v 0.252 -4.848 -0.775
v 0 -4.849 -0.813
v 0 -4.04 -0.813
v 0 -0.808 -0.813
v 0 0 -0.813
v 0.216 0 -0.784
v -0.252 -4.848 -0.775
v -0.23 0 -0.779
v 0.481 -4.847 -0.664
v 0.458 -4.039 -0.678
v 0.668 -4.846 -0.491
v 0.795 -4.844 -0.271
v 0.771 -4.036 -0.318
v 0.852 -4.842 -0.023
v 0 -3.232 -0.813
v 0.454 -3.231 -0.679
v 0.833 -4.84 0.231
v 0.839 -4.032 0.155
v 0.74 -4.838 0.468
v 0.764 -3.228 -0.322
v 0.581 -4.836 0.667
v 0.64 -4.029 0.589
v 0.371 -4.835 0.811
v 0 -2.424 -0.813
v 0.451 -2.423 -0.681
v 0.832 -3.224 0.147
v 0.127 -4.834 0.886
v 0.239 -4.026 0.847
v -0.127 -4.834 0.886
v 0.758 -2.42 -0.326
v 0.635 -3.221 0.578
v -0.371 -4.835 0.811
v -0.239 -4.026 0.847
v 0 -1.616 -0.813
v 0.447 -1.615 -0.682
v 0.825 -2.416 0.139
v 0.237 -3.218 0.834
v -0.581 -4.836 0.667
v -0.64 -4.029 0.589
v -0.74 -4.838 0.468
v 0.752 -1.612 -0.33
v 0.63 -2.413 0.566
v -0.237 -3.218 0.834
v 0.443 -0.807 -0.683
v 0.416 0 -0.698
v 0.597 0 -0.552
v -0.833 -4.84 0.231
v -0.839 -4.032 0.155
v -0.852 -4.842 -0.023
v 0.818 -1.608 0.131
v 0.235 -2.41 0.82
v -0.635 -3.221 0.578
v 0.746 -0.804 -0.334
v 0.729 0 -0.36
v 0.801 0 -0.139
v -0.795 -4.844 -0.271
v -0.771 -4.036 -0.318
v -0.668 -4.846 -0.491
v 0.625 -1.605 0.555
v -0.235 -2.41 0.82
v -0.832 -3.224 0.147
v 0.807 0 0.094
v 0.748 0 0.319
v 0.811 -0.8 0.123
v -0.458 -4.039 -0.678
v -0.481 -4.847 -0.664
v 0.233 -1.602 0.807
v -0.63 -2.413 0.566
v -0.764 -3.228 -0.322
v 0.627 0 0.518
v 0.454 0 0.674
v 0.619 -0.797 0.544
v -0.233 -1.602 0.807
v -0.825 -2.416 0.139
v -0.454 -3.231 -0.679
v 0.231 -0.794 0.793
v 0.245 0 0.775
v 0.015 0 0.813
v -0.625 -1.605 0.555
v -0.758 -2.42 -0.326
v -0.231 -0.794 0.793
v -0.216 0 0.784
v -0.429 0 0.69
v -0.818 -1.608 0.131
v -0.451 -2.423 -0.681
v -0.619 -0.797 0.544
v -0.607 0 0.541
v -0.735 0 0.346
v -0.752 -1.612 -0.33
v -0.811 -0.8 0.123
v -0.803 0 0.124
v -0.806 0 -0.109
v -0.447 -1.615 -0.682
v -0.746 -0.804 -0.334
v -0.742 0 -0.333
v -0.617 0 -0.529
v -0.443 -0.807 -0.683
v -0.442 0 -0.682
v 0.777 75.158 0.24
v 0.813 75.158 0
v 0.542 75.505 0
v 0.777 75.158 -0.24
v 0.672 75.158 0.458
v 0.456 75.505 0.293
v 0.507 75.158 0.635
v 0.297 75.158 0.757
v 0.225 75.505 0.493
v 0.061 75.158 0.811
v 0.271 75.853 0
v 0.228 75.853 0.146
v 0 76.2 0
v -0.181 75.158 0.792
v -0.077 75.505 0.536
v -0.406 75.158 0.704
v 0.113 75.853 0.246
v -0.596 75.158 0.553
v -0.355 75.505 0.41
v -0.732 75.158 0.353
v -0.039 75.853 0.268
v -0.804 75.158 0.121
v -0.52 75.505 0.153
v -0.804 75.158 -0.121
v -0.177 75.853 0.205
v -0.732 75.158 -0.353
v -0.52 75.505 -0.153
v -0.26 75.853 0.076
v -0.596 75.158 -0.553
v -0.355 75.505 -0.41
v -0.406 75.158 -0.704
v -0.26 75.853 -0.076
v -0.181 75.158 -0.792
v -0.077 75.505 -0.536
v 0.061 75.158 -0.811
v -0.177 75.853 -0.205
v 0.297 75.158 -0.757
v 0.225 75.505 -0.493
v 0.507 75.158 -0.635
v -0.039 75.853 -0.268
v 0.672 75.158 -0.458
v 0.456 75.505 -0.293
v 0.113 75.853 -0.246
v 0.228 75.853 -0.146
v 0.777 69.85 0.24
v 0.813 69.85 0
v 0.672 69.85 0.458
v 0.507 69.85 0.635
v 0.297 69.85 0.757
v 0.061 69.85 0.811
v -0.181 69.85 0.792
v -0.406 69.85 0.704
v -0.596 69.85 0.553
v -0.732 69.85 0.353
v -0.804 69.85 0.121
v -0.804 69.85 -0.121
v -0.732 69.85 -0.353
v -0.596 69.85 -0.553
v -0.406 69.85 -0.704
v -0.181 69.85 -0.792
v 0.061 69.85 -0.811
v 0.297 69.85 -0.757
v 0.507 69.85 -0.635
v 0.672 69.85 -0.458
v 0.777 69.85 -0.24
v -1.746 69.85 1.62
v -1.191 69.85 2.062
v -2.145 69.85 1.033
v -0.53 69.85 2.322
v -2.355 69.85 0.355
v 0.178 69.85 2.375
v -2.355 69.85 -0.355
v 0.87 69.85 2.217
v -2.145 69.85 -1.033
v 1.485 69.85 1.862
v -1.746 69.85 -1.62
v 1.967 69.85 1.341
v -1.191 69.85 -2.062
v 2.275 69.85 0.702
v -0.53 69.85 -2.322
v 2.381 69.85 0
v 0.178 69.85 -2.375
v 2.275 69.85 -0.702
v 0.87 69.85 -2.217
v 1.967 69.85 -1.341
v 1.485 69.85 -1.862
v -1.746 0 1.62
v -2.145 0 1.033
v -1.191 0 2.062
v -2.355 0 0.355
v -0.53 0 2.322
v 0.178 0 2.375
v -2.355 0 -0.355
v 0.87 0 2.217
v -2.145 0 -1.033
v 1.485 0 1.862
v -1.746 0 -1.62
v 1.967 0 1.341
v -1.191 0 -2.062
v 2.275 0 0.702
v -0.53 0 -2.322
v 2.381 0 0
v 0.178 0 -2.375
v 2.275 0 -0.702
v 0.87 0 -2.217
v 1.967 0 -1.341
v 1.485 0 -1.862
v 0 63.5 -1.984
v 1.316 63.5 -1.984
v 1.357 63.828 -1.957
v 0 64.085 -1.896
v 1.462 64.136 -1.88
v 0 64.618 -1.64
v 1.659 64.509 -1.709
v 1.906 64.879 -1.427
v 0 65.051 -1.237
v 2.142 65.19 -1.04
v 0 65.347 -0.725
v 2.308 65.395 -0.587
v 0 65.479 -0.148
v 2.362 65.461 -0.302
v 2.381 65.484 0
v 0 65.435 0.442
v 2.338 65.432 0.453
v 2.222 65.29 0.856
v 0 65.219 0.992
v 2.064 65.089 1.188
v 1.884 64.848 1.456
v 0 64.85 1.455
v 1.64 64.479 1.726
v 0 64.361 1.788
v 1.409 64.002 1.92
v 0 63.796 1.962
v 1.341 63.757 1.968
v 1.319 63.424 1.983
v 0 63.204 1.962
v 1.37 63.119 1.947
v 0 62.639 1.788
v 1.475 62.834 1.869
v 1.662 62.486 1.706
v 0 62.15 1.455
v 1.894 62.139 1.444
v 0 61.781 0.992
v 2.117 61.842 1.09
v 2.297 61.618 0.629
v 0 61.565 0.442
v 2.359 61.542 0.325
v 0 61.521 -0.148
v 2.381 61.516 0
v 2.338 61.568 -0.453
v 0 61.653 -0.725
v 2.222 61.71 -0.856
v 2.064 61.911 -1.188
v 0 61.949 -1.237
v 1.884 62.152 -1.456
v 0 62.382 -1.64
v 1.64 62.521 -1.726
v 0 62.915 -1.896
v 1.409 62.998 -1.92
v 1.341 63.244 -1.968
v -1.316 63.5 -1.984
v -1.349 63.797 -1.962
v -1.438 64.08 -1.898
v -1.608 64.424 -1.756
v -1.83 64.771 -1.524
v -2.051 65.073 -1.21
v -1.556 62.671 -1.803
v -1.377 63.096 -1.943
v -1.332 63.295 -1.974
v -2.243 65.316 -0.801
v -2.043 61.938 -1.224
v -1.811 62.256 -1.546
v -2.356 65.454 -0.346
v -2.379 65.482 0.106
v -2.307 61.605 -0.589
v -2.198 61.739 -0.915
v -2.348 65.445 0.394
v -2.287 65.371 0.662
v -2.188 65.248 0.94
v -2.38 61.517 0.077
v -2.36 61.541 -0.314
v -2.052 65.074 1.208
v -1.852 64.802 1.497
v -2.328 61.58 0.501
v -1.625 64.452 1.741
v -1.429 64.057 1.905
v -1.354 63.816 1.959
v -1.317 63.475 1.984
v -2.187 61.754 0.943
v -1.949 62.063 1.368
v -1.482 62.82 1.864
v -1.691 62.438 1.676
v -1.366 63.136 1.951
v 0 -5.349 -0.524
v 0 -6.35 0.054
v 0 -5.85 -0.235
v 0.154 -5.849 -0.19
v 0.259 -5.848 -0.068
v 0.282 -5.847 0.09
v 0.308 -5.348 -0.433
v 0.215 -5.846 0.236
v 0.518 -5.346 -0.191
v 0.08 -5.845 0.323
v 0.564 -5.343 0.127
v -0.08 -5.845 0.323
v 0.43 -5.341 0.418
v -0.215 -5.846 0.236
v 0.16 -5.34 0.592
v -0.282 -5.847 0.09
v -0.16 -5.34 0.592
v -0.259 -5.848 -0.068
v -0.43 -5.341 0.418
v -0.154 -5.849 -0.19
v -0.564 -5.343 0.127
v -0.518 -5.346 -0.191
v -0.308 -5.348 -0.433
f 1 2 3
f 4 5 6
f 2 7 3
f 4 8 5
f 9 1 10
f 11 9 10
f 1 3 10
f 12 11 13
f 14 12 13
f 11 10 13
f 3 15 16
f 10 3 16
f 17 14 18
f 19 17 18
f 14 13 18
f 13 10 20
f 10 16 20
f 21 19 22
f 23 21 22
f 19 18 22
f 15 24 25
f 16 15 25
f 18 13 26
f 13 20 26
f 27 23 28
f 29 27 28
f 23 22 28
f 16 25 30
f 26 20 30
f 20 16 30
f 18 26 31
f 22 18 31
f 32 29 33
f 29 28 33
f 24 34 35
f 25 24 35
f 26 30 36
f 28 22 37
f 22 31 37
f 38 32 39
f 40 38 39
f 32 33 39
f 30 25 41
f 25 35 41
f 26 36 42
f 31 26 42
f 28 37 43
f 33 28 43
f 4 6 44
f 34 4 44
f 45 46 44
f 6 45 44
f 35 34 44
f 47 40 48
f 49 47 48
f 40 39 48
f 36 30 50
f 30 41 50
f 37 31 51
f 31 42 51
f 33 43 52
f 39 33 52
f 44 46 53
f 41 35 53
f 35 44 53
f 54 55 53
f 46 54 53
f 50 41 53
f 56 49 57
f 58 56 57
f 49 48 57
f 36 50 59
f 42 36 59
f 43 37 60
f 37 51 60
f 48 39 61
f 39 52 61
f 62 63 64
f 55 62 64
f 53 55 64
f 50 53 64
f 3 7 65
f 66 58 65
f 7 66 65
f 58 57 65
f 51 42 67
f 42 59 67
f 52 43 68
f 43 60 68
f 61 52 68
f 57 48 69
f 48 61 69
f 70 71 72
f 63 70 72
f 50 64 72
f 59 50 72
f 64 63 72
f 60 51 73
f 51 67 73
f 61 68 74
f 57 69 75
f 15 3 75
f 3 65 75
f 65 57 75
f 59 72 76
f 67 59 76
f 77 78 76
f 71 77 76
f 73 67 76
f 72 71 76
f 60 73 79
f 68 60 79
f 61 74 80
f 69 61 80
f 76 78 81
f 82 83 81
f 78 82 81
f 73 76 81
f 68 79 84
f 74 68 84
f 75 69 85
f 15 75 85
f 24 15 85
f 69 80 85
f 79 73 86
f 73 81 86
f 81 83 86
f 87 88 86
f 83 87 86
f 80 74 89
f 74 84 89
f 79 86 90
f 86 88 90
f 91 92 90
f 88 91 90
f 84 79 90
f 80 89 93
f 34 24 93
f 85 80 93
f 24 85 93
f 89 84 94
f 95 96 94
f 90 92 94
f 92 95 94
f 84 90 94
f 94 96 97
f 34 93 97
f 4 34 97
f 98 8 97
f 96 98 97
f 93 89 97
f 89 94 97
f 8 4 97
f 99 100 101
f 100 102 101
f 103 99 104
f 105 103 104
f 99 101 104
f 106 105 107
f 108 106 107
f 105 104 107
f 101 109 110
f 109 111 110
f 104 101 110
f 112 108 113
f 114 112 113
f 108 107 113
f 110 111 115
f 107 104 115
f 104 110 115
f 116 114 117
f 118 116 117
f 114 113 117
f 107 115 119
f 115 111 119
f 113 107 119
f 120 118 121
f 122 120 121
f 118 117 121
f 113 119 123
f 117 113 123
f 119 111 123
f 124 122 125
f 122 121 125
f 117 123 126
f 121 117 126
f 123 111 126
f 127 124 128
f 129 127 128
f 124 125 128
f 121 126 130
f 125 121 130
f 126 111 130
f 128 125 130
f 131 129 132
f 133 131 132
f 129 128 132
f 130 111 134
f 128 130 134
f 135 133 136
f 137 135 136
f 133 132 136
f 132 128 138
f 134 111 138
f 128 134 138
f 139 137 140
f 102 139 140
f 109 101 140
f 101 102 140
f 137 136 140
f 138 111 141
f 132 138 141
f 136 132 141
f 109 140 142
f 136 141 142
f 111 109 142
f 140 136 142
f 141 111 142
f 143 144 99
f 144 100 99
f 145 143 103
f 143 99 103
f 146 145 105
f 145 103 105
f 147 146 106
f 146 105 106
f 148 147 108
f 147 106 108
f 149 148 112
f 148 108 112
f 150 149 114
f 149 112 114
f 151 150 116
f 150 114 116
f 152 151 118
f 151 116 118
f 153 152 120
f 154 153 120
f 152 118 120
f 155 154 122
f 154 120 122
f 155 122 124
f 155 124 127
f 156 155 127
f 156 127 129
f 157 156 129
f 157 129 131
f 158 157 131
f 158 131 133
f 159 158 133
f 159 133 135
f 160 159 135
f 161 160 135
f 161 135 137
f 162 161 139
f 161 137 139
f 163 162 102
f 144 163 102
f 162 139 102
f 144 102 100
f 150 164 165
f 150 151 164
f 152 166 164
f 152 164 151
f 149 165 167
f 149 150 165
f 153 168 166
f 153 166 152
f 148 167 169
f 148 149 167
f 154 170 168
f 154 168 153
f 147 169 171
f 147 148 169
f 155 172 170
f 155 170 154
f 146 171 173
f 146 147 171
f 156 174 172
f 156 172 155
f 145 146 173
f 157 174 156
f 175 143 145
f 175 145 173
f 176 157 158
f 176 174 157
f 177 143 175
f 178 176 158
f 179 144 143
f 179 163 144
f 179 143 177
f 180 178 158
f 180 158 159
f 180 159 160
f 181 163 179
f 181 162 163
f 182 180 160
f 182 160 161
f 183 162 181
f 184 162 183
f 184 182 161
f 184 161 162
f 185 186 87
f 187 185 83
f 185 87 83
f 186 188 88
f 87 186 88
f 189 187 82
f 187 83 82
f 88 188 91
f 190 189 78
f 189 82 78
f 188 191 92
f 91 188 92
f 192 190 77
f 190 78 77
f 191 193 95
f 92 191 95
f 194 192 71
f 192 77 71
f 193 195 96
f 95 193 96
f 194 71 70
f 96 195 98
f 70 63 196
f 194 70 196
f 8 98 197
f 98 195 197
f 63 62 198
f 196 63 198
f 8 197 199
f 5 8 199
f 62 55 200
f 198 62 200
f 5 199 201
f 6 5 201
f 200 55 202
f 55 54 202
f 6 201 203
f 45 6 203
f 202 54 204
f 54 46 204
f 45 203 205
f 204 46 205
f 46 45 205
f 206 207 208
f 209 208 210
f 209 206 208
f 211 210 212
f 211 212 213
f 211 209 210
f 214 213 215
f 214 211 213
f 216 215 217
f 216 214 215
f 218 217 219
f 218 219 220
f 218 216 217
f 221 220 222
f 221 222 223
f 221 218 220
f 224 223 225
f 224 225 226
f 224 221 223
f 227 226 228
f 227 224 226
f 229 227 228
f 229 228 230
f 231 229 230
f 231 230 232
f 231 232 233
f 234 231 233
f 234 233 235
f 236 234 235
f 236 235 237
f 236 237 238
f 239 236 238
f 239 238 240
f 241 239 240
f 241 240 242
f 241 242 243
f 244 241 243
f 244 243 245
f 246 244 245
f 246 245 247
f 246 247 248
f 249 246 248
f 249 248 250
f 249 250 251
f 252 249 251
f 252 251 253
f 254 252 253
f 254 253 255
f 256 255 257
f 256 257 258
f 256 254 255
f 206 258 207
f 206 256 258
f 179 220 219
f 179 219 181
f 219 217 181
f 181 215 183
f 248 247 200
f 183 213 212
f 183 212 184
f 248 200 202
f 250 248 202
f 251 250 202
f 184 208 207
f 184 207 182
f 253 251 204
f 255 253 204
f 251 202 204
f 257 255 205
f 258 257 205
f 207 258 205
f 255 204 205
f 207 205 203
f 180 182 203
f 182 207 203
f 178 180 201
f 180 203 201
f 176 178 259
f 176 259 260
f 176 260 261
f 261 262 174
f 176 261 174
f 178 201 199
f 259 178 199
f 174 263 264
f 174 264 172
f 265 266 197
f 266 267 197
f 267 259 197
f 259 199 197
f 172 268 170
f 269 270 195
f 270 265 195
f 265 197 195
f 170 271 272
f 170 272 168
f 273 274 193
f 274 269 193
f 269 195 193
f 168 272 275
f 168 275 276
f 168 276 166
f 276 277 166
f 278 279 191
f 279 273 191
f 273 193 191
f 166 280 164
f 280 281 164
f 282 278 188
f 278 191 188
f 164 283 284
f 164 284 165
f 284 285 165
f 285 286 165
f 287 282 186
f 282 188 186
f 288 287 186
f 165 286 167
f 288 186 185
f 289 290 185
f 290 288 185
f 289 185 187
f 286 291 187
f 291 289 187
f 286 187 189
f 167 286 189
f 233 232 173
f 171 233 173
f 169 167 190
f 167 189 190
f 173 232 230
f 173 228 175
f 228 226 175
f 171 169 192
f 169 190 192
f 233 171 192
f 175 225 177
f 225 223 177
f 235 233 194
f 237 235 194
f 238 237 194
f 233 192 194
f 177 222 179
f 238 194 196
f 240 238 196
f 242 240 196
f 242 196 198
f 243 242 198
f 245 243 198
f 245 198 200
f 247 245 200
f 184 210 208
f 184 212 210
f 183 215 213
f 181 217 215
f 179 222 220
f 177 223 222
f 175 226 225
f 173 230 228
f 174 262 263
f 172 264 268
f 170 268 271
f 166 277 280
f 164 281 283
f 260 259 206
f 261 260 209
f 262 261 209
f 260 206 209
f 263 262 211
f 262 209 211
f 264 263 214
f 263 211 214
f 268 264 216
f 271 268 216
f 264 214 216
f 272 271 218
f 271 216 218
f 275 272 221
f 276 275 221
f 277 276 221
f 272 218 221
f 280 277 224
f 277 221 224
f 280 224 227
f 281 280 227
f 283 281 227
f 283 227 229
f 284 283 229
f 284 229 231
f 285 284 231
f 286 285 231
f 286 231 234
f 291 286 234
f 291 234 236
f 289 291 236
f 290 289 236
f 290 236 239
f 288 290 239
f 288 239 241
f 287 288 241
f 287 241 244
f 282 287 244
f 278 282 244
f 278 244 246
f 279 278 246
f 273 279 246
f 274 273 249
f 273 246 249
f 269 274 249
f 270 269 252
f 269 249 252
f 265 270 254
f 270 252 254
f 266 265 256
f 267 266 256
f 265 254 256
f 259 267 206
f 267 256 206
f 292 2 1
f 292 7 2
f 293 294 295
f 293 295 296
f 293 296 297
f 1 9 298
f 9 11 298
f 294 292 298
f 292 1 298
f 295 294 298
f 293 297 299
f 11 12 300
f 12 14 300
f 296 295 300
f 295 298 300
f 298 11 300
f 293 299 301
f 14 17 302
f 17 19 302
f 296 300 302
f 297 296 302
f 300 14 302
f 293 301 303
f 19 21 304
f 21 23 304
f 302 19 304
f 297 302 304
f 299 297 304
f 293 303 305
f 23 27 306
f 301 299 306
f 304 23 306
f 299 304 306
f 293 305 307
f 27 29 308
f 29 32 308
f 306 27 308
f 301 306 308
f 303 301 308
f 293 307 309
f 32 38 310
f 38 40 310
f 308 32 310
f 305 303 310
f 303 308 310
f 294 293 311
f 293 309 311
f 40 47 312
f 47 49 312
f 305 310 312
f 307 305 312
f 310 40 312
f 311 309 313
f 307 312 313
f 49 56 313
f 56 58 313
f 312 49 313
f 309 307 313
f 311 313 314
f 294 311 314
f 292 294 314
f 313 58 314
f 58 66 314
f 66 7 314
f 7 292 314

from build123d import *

# Parameters (mm, degrees)
SKETCH1_R               = 2.38125
BOSS_EXTRUDE1_DEPTH     = 69.85
SKETCH7_R               = 1.984375
CUT_EXTRUDE1_DEPTH      = 3.38125
CUT_EXTRUDE1_DEPTH_BACK = 3.38125


with BuildPart() as part:
    # Sketch1 → Boss-Extrude1 (new body)
    with BuildSketch(Plane(origin=(0, 0, 0), x_dir=(1, 0, 0), z_dir=(0, 1, 0))):
        Circle(SKETCH1_R)
    extrude(amount=BOSS_EXTRUDE1_DEPTH)

    # Sketch2 → Revolve4 (revolve)
    with BuildSketch(Plane.XY):
        Polygon((0, 76.2), (0, 69.85), (0.8128, 69.85), (0.8128, 75.157753569), align=None)
    revolve(axis=Axis((0, 79.243977314, 0), (0, -1, 0)))

    # Sketch4 → Revolve5 (revolve)
    with BuildSketch(Plane(origin=(0, 0, 0), x_dir=(0, 0, -1), z_dir=(1, 0, 0))):
        Polygon((0, 0), (-0.054059899, -6.35), (0.8128, -4.848554612), (0.8128, 0), align=None)
    revolve(axis=Axis((0, 0, 0), (0, -0.999963763, 0.008513061)))

    # Sketch7 → Cut-Extrude1 (cut, two sides)
    with BuildSketch(Plane(origin=(0, 0, 0), x_dir=(0, 0, -1), z_dir=(1, 0, 0))) as cut_extrude1_sk:
        with Locations((0, 63.5)):
            Circle(SKETCH7_R)
    extrude(amount=CUT_EXTRUDE1_DEPTH, mode=Mode.SUBTRACT)
    extrude(cut_extrude1_sk.sketch, amount=-CUT_EXTRUDE1_DEPTH_BACK, mode=Mode.SUBTRACT)


solid = part.part
